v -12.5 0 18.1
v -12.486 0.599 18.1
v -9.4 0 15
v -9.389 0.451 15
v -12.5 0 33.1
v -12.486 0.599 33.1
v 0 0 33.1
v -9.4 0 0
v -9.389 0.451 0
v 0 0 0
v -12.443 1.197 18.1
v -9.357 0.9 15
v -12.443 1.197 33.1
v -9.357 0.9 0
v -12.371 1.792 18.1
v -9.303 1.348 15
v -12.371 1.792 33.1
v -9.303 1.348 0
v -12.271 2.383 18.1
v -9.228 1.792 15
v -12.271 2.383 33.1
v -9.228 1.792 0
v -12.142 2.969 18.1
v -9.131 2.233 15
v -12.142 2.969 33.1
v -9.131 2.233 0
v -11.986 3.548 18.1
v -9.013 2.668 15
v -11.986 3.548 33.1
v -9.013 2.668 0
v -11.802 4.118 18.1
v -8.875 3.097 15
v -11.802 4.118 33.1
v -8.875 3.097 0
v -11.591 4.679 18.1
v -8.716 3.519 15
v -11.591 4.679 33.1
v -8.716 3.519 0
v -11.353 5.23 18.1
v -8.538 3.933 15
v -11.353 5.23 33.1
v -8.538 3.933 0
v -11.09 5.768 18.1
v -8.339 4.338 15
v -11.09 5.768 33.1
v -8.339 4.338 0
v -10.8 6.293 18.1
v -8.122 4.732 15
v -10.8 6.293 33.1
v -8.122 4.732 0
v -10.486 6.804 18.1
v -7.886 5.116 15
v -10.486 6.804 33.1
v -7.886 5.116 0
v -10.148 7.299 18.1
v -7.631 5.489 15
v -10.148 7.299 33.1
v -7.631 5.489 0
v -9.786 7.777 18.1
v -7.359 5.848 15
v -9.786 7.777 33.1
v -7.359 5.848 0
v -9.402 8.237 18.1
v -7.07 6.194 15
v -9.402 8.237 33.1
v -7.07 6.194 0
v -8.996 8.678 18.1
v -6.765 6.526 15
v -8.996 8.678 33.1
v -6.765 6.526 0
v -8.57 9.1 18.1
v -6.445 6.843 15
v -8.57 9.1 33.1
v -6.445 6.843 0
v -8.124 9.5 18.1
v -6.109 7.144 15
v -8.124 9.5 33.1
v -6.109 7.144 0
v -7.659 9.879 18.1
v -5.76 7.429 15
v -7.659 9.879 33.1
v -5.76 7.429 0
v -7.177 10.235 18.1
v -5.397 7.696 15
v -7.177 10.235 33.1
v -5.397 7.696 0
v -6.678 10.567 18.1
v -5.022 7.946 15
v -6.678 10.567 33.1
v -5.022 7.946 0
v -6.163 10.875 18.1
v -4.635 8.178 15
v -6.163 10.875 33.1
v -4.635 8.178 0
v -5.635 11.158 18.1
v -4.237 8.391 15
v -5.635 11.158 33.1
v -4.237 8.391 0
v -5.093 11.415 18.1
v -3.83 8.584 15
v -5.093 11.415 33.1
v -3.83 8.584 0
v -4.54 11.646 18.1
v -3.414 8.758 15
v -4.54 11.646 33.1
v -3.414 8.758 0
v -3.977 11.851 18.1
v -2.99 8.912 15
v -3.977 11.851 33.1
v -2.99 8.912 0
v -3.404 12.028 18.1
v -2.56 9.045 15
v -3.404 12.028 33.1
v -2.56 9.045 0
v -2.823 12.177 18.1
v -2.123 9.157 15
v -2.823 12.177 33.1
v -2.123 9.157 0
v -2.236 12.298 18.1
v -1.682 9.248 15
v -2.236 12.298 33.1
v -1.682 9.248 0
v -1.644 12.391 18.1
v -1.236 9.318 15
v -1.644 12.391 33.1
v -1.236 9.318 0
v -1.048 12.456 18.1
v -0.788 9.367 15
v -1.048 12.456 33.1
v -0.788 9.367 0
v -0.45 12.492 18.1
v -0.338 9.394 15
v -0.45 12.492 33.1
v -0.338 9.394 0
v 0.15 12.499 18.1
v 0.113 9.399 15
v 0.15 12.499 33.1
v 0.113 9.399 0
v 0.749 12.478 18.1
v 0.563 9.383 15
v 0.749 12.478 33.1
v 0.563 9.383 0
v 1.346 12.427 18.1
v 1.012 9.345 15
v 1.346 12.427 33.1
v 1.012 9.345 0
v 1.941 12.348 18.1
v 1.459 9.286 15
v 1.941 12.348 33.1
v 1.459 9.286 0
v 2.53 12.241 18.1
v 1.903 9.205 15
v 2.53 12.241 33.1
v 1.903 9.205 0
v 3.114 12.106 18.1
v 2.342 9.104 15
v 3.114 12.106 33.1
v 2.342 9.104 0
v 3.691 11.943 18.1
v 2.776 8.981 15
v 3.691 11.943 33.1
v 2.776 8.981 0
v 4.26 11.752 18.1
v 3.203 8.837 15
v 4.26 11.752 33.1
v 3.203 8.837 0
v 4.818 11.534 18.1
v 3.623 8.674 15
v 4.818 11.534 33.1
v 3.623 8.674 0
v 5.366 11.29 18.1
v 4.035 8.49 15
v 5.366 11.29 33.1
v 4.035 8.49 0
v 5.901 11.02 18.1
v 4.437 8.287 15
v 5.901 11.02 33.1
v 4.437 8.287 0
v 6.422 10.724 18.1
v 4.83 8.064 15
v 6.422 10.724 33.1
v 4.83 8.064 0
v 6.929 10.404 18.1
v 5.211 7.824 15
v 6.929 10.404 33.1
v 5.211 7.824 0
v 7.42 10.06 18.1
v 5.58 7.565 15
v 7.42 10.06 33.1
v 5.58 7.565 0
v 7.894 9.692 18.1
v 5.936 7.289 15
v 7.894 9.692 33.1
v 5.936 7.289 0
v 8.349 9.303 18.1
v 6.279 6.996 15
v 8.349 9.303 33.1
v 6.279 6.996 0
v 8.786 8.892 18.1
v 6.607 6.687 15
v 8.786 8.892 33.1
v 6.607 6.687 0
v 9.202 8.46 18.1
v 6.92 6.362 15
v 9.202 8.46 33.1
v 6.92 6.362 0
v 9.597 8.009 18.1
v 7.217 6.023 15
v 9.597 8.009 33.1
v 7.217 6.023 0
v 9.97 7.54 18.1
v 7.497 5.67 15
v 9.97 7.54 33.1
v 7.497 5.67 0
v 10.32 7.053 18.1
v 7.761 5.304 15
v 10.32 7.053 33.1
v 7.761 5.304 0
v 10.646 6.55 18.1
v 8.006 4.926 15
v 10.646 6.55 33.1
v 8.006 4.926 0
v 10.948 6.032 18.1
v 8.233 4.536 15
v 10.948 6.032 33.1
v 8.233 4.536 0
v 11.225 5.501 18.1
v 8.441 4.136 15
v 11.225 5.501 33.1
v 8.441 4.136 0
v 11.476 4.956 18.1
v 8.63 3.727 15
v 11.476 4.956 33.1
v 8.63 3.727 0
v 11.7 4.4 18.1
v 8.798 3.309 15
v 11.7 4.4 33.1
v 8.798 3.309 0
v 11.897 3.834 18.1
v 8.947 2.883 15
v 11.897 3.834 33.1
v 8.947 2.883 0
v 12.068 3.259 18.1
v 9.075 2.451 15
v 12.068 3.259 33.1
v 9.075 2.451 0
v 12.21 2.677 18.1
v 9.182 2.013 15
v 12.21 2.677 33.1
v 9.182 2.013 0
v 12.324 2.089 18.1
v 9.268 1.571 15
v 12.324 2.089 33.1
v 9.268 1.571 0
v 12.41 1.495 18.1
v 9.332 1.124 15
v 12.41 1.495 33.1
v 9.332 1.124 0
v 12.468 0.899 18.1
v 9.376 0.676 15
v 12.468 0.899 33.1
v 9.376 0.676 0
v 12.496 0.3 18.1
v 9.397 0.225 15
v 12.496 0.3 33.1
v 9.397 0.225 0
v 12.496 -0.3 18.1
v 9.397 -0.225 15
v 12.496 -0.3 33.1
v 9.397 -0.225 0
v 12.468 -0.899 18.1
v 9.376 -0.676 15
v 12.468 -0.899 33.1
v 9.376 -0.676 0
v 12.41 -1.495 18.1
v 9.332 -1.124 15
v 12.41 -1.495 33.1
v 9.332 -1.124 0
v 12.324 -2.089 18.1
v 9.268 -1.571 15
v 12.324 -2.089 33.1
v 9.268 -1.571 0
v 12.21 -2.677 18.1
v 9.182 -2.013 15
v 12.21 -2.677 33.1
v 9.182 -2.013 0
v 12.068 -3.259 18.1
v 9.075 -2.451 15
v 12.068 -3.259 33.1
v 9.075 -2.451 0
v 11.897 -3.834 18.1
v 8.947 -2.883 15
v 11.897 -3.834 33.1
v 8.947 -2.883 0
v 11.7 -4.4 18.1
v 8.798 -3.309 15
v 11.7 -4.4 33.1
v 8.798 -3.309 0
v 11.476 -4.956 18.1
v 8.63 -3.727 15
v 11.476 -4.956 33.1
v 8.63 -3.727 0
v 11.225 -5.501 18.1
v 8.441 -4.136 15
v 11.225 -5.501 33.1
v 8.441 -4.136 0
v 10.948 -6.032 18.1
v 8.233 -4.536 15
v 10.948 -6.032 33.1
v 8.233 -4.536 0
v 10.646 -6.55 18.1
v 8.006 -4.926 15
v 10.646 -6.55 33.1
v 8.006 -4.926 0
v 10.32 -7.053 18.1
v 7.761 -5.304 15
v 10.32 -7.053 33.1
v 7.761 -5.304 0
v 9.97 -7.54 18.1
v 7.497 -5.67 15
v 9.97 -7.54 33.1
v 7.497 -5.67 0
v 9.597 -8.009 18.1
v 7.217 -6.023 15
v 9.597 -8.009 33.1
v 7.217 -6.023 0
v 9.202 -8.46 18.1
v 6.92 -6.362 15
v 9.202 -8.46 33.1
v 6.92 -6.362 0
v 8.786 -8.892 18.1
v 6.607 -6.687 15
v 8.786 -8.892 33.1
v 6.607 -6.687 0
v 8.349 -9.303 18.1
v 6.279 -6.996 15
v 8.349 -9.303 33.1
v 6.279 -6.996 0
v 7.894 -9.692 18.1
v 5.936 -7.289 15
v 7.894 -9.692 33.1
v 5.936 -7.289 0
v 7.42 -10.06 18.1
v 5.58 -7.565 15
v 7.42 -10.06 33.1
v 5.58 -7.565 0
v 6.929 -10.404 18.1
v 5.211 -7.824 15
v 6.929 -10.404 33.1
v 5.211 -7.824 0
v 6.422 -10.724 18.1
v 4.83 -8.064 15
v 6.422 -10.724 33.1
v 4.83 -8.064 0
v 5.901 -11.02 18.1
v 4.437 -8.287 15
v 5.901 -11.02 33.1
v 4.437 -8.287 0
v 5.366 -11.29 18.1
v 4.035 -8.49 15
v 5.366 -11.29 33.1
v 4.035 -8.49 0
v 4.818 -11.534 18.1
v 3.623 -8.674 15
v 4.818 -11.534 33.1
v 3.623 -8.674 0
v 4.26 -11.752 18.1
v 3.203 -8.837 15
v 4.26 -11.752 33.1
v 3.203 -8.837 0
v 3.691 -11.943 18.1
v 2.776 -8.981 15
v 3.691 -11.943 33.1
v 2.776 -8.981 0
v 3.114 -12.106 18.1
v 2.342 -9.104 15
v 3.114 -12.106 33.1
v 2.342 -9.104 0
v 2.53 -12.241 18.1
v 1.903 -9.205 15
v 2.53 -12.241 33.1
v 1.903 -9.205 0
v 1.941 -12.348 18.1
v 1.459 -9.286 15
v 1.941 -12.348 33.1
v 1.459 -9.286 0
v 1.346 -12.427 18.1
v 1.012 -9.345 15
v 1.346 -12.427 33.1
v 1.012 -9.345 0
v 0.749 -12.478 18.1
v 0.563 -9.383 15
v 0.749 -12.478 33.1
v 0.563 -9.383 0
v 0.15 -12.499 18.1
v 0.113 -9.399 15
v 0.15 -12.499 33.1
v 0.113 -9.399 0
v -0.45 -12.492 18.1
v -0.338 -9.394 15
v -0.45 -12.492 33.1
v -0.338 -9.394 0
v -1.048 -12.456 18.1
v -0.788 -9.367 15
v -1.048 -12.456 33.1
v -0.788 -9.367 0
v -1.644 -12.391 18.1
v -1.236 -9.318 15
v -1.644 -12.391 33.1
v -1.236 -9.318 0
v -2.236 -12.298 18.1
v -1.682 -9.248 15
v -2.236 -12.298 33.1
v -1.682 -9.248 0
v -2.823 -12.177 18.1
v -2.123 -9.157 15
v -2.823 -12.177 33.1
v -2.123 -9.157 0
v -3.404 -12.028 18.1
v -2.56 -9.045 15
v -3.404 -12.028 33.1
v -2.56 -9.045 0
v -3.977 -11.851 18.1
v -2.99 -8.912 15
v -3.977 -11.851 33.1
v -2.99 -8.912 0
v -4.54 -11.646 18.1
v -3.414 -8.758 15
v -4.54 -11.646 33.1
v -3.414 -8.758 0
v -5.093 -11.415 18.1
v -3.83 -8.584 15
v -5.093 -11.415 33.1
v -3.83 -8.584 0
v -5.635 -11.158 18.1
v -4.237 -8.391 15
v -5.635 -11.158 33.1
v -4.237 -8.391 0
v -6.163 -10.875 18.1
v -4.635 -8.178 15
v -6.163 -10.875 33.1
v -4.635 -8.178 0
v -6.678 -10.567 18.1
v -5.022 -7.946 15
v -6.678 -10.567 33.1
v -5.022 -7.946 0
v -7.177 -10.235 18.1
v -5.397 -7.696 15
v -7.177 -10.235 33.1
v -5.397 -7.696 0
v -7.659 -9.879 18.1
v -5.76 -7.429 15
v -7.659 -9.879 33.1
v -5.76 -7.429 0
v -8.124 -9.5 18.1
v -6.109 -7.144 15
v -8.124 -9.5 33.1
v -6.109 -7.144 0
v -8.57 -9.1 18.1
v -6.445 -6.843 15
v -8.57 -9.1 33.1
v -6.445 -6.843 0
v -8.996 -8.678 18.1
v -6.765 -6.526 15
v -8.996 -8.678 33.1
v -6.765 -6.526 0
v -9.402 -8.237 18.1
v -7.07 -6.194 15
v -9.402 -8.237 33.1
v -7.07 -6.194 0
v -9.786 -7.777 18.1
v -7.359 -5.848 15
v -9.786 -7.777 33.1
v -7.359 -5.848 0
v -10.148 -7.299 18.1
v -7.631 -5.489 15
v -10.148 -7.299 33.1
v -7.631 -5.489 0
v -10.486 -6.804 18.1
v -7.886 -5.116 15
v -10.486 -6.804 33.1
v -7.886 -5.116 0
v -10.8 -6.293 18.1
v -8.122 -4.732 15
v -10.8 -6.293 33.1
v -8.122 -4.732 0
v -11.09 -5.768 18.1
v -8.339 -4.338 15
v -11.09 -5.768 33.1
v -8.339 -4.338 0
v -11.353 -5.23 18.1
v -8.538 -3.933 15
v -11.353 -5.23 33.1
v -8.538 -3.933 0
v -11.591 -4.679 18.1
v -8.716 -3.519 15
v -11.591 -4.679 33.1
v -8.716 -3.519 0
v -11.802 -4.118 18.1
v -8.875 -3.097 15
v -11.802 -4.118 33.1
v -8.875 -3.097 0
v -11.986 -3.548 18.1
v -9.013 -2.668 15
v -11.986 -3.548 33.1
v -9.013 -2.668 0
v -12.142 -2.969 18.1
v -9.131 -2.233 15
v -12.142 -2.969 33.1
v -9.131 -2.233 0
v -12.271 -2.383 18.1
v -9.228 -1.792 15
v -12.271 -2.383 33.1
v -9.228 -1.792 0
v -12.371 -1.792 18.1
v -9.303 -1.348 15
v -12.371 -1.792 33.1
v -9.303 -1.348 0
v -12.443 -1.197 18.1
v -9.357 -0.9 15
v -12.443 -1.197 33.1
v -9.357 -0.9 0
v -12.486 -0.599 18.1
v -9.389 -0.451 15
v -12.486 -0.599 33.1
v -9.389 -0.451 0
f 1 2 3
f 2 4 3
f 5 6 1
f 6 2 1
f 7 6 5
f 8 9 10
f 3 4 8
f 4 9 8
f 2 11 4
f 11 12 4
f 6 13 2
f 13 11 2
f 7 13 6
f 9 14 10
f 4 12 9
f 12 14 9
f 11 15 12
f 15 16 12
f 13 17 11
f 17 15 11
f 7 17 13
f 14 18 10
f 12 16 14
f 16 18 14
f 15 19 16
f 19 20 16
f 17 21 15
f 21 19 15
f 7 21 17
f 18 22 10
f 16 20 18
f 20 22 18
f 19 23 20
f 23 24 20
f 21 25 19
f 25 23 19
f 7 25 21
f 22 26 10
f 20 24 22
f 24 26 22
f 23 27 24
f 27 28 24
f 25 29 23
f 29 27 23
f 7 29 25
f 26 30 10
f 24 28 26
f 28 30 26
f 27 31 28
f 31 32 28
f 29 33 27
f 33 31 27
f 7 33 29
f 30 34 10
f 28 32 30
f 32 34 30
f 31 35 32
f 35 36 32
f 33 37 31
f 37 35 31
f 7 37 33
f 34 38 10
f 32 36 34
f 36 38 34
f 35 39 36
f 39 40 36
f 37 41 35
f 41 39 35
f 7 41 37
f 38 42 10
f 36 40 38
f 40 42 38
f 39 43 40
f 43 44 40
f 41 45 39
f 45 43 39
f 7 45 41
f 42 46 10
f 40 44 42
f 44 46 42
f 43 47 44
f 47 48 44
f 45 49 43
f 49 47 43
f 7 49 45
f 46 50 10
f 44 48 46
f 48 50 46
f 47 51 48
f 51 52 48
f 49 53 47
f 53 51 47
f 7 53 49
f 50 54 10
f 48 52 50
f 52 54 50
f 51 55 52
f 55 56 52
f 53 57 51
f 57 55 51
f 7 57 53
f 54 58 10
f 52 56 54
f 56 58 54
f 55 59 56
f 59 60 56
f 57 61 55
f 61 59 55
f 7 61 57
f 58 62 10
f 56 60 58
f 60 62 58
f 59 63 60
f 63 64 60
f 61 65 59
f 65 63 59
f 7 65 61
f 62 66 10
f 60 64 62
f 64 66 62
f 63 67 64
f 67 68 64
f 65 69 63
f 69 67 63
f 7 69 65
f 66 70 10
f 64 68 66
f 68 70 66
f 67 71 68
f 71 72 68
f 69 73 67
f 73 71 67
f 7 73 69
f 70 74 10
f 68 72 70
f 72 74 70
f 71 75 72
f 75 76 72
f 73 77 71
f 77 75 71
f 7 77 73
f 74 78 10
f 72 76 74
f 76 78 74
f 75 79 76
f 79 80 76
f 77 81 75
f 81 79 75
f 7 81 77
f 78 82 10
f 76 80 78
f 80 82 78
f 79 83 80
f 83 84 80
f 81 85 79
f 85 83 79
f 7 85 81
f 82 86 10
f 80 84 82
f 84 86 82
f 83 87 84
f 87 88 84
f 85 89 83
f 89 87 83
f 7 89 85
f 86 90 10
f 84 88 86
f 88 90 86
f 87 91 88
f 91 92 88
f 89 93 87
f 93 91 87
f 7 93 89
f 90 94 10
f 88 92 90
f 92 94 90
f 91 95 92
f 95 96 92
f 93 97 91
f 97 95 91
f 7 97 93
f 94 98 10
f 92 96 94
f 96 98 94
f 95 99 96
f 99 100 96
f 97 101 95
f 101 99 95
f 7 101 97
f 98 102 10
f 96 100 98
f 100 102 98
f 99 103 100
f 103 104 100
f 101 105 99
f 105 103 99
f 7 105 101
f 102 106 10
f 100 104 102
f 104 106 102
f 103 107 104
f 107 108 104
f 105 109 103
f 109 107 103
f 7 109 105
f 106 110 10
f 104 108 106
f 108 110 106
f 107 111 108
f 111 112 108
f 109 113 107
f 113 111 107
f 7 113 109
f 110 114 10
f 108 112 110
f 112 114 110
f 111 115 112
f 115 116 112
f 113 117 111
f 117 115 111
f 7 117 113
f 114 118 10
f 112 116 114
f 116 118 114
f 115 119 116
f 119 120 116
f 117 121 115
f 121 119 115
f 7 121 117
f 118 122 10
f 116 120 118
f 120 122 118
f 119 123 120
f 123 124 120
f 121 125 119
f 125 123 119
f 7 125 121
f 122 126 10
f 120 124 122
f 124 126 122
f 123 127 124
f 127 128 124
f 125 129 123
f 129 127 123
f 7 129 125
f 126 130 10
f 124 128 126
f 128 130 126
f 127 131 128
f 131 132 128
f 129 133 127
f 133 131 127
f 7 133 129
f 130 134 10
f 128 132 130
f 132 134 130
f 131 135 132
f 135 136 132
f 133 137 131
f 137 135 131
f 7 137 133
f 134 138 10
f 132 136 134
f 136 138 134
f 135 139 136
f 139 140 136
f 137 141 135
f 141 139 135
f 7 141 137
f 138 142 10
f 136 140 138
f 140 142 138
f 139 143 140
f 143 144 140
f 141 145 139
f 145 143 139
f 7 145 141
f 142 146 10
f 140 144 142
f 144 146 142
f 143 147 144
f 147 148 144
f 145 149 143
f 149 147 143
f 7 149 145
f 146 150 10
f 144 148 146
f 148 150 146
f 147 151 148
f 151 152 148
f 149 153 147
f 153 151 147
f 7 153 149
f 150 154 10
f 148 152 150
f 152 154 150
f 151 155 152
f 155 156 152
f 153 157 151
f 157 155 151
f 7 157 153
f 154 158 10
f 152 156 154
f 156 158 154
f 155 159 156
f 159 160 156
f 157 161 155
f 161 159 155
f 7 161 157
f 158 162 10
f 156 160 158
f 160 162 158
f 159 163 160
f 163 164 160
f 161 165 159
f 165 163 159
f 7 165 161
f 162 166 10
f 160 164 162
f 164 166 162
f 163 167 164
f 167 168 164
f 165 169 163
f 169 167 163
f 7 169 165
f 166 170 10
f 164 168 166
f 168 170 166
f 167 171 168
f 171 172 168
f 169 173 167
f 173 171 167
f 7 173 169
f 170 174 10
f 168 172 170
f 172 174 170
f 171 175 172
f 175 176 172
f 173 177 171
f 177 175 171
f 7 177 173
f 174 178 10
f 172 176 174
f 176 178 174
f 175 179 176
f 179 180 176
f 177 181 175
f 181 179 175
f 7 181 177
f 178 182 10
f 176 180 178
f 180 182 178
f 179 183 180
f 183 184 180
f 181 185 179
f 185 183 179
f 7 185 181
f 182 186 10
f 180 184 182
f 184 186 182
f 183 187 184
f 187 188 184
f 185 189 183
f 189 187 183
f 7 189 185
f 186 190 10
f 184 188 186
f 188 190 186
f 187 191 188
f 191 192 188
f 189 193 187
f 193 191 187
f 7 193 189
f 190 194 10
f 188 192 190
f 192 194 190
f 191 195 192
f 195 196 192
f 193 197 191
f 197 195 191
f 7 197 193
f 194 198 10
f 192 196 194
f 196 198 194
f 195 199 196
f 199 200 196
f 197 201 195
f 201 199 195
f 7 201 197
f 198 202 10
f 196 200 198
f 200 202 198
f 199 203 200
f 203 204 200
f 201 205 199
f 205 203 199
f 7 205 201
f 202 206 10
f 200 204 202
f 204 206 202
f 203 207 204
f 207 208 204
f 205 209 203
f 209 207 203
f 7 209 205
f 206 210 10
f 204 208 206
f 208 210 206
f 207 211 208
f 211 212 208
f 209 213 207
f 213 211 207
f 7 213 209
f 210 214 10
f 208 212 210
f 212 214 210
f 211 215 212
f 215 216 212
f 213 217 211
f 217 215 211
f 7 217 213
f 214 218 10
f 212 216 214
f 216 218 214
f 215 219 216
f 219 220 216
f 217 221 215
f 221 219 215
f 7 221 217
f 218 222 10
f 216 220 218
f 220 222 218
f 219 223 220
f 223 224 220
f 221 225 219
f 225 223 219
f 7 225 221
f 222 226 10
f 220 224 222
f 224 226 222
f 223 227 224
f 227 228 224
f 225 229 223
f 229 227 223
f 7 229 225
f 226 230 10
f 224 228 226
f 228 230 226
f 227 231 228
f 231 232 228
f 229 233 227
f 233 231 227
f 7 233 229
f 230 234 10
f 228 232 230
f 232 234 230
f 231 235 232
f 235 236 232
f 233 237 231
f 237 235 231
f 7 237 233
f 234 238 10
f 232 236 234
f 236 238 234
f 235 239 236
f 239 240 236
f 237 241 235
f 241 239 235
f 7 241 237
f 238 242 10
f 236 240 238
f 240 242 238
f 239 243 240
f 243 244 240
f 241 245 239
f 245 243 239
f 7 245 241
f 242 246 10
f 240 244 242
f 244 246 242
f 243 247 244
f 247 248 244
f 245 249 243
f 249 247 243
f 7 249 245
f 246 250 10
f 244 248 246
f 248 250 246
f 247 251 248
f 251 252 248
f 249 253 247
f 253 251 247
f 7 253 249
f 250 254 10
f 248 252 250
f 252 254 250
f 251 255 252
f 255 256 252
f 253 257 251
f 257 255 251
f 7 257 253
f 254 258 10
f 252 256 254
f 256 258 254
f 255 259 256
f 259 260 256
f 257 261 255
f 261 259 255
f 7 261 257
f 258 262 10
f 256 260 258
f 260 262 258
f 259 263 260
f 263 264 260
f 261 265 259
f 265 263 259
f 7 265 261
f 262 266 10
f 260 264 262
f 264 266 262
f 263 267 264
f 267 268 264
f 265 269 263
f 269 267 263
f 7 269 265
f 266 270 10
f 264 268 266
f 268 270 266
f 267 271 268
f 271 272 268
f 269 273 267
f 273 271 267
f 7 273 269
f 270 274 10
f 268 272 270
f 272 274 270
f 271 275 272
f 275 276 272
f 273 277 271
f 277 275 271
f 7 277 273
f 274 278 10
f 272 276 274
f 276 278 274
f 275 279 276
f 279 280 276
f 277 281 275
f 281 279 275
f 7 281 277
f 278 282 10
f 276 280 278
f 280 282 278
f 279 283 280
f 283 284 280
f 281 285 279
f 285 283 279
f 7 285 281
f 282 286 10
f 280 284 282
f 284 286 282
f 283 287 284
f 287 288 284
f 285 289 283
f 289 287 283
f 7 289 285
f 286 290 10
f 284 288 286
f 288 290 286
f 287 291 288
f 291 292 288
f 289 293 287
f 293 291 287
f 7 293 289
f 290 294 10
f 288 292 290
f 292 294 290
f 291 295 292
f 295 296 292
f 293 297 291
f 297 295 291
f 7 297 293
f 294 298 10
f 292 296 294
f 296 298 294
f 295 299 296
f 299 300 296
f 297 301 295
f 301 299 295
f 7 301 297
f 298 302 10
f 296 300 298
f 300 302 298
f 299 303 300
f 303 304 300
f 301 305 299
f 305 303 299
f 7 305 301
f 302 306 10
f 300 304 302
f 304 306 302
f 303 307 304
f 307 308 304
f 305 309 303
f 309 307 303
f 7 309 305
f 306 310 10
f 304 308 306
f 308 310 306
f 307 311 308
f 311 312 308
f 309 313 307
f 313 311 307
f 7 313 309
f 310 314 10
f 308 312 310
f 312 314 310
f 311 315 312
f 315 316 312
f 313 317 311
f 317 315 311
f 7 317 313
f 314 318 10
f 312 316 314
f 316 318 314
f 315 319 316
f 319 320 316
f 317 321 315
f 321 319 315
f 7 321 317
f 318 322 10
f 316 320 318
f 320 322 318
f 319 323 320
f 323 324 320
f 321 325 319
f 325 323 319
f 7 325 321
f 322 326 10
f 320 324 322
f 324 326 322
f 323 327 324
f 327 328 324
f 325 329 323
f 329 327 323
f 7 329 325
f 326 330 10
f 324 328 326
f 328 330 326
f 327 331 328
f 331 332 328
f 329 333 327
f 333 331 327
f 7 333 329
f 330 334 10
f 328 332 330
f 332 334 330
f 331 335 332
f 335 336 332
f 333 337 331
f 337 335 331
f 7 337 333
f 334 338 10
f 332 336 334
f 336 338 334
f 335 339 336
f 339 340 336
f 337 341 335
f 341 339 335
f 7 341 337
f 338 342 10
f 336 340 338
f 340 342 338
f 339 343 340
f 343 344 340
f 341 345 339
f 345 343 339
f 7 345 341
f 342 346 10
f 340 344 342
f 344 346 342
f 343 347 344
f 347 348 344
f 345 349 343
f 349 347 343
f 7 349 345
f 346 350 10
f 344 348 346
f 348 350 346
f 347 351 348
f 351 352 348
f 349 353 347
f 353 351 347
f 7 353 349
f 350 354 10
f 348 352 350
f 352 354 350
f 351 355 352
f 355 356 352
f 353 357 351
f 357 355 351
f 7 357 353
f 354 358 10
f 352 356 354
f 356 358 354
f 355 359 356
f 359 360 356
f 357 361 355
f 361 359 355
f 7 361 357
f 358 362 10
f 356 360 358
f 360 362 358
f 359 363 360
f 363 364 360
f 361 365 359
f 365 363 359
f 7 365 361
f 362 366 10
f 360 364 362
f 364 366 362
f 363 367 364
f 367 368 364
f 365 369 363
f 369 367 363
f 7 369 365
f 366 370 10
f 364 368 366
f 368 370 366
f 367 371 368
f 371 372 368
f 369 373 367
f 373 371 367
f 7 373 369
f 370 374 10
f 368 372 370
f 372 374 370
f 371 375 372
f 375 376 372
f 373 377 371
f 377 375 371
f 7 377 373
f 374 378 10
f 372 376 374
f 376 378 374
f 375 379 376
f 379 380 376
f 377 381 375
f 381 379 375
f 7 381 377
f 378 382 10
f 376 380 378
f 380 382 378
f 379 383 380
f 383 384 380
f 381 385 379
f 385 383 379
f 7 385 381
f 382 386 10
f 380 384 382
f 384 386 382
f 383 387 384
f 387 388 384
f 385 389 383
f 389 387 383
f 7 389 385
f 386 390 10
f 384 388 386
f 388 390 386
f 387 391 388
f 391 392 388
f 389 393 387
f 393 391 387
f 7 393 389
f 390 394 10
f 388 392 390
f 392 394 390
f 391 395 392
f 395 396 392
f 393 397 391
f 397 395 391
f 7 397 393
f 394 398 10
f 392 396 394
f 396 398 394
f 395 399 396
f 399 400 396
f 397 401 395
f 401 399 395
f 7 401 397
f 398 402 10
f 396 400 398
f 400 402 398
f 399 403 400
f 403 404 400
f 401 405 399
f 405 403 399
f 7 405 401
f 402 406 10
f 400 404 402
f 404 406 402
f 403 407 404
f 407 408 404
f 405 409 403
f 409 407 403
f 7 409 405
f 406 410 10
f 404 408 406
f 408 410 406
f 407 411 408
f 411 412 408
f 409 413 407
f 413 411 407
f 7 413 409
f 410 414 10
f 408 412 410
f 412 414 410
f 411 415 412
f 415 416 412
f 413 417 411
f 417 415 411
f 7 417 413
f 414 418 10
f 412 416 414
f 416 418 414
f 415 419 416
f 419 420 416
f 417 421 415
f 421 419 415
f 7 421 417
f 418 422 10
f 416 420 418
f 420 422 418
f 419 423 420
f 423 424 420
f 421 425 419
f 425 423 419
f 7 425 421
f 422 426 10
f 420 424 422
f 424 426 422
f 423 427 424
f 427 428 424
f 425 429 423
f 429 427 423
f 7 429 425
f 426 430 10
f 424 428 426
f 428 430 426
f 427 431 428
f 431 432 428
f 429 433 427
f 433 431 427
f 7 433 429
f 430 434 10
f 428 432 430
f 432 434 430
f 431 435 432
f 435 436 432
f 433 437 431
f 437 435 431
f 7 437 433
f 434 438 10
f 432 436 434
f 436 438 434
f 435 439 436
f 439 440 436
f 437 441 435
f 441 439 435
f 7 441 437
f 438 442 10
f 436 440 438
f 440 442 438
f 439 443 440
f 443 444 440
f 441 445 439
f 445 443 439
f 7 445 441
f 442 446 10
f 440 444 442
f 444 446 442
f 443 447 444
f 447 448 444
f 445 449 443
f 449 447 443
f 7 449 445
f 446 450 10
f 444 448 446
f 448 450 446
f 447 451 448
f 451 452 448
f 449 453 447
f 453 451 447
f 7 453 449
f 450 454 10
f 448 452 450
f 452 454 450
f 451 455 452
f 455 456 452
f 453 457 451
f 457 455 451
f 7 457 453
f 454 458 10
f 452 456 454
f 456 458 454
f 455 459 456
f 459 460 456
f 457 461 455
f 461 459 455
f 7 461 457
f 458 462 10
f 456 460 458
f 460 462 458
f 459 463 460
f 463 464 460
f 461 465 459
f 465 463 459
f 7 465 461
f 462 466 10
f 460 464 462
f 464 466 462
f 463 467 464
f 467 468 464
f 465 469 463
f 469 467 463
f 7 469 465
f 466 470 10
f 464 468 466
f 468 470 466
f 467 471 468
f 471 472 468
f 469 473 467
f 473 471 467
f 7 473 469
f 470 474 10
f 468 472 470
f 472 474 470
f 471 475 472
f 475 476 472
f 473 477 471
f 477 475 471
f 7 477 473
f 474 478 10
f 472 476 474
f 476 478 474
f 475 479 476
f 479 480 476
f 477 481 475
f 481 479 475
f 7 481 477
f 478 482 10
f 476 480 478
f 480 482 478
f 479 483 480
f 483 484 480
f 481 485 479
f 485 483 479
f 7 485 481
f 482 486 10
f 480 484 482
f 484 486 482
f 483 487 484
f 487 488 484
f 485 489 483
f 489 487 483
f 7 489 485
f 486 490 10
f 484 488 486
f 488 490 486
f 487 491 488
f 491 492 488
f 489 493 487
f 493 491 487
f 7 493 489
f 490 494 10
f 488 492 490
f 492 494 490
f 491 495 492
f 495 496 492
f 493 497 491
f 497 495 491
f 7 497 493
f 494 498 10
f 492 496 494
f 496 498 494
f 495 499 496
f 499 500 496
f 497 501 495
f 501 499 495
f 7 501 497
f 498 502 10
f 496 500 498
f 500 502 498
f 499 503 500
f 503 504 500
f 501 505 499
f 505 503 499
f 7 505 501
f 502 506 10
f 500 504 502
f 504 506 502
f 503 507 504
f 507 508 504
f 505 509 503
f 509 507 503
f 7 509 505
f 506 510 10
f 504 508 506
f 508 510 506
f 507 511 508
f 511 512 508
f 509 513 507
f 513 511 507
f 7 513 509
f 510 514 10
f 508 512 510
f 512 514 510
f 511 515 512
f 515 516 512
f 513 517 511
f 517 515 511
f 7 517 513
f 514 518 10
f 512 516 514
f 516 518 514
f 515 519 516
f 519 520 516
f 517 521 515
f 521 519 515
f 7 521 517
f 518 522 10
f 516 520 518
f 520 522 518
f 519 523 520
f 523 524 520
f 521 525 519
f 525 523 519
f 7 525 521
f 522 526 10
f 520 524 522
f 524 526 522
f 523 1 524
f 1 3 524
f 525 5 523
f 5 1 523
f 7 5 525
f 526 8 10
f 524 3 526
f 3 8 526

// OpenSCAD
Plug_Diameter = 18.8; // 0.01
Plug_Depth    = 15.0; // 0.01
Knob_Diameter = 25.0; // 0.01
Knob_Height   = 15.0; // 0.01

plug_radius = Plug_Diameter / 2;
knob_radius = Knob_Diameter / 2;
knob_offset = cos(45) * knob_radius;

$fa = $preview ? 15 : 2;
$fs = $preview ? 1.25 : 0.6;

function fragments(r, a=360) = $fn > 0
	? ($fn >= 3 ? $fn : 3)
	: ceil(max(min(a/$fa, r*2*PI/$fs), 5));

function arc(r, x, y, a1, a2) = [
	for (a = [a1:(a2-a1)/fragments(r, abs(a2-a1)):a2])
		[cos(a)*r+x, sin(a)*r+y]
];

module outline() {
	h = Knob_Diameter/2 - plug_radius;
	polygon(concat(
		[
			[0, 0],
			[plug_radius, 0],
			[plug_radius, Plug_Depth],
			[plug_radius+h, Plug_Depth+h],
			[plug_radius+h, Plug_Depth+h+Knob_Height],
			[0, Plug_Depth+h+Knob_Height],
		]
		//arc(knob_radius, plug_radius+knob_radius, Plug_Depth, 180, 135),
		//arc(knob_radius, 0, Plug_Depth+h+knob_offset, 335, 360),
		//arc(knob_radius, 0, Plug_Depth+h+knob_offset, 0, 45)
	));
}

//polygon(arc(knob_radius, plug_radius+knob_radius, Plug_Depth, 180, 135));
//polygon(arc(knob_radius, plug_radius+knob_radius, 180, 135));

//outline();

rotate_extrude(angle=360, convexity=5)
	outline();
